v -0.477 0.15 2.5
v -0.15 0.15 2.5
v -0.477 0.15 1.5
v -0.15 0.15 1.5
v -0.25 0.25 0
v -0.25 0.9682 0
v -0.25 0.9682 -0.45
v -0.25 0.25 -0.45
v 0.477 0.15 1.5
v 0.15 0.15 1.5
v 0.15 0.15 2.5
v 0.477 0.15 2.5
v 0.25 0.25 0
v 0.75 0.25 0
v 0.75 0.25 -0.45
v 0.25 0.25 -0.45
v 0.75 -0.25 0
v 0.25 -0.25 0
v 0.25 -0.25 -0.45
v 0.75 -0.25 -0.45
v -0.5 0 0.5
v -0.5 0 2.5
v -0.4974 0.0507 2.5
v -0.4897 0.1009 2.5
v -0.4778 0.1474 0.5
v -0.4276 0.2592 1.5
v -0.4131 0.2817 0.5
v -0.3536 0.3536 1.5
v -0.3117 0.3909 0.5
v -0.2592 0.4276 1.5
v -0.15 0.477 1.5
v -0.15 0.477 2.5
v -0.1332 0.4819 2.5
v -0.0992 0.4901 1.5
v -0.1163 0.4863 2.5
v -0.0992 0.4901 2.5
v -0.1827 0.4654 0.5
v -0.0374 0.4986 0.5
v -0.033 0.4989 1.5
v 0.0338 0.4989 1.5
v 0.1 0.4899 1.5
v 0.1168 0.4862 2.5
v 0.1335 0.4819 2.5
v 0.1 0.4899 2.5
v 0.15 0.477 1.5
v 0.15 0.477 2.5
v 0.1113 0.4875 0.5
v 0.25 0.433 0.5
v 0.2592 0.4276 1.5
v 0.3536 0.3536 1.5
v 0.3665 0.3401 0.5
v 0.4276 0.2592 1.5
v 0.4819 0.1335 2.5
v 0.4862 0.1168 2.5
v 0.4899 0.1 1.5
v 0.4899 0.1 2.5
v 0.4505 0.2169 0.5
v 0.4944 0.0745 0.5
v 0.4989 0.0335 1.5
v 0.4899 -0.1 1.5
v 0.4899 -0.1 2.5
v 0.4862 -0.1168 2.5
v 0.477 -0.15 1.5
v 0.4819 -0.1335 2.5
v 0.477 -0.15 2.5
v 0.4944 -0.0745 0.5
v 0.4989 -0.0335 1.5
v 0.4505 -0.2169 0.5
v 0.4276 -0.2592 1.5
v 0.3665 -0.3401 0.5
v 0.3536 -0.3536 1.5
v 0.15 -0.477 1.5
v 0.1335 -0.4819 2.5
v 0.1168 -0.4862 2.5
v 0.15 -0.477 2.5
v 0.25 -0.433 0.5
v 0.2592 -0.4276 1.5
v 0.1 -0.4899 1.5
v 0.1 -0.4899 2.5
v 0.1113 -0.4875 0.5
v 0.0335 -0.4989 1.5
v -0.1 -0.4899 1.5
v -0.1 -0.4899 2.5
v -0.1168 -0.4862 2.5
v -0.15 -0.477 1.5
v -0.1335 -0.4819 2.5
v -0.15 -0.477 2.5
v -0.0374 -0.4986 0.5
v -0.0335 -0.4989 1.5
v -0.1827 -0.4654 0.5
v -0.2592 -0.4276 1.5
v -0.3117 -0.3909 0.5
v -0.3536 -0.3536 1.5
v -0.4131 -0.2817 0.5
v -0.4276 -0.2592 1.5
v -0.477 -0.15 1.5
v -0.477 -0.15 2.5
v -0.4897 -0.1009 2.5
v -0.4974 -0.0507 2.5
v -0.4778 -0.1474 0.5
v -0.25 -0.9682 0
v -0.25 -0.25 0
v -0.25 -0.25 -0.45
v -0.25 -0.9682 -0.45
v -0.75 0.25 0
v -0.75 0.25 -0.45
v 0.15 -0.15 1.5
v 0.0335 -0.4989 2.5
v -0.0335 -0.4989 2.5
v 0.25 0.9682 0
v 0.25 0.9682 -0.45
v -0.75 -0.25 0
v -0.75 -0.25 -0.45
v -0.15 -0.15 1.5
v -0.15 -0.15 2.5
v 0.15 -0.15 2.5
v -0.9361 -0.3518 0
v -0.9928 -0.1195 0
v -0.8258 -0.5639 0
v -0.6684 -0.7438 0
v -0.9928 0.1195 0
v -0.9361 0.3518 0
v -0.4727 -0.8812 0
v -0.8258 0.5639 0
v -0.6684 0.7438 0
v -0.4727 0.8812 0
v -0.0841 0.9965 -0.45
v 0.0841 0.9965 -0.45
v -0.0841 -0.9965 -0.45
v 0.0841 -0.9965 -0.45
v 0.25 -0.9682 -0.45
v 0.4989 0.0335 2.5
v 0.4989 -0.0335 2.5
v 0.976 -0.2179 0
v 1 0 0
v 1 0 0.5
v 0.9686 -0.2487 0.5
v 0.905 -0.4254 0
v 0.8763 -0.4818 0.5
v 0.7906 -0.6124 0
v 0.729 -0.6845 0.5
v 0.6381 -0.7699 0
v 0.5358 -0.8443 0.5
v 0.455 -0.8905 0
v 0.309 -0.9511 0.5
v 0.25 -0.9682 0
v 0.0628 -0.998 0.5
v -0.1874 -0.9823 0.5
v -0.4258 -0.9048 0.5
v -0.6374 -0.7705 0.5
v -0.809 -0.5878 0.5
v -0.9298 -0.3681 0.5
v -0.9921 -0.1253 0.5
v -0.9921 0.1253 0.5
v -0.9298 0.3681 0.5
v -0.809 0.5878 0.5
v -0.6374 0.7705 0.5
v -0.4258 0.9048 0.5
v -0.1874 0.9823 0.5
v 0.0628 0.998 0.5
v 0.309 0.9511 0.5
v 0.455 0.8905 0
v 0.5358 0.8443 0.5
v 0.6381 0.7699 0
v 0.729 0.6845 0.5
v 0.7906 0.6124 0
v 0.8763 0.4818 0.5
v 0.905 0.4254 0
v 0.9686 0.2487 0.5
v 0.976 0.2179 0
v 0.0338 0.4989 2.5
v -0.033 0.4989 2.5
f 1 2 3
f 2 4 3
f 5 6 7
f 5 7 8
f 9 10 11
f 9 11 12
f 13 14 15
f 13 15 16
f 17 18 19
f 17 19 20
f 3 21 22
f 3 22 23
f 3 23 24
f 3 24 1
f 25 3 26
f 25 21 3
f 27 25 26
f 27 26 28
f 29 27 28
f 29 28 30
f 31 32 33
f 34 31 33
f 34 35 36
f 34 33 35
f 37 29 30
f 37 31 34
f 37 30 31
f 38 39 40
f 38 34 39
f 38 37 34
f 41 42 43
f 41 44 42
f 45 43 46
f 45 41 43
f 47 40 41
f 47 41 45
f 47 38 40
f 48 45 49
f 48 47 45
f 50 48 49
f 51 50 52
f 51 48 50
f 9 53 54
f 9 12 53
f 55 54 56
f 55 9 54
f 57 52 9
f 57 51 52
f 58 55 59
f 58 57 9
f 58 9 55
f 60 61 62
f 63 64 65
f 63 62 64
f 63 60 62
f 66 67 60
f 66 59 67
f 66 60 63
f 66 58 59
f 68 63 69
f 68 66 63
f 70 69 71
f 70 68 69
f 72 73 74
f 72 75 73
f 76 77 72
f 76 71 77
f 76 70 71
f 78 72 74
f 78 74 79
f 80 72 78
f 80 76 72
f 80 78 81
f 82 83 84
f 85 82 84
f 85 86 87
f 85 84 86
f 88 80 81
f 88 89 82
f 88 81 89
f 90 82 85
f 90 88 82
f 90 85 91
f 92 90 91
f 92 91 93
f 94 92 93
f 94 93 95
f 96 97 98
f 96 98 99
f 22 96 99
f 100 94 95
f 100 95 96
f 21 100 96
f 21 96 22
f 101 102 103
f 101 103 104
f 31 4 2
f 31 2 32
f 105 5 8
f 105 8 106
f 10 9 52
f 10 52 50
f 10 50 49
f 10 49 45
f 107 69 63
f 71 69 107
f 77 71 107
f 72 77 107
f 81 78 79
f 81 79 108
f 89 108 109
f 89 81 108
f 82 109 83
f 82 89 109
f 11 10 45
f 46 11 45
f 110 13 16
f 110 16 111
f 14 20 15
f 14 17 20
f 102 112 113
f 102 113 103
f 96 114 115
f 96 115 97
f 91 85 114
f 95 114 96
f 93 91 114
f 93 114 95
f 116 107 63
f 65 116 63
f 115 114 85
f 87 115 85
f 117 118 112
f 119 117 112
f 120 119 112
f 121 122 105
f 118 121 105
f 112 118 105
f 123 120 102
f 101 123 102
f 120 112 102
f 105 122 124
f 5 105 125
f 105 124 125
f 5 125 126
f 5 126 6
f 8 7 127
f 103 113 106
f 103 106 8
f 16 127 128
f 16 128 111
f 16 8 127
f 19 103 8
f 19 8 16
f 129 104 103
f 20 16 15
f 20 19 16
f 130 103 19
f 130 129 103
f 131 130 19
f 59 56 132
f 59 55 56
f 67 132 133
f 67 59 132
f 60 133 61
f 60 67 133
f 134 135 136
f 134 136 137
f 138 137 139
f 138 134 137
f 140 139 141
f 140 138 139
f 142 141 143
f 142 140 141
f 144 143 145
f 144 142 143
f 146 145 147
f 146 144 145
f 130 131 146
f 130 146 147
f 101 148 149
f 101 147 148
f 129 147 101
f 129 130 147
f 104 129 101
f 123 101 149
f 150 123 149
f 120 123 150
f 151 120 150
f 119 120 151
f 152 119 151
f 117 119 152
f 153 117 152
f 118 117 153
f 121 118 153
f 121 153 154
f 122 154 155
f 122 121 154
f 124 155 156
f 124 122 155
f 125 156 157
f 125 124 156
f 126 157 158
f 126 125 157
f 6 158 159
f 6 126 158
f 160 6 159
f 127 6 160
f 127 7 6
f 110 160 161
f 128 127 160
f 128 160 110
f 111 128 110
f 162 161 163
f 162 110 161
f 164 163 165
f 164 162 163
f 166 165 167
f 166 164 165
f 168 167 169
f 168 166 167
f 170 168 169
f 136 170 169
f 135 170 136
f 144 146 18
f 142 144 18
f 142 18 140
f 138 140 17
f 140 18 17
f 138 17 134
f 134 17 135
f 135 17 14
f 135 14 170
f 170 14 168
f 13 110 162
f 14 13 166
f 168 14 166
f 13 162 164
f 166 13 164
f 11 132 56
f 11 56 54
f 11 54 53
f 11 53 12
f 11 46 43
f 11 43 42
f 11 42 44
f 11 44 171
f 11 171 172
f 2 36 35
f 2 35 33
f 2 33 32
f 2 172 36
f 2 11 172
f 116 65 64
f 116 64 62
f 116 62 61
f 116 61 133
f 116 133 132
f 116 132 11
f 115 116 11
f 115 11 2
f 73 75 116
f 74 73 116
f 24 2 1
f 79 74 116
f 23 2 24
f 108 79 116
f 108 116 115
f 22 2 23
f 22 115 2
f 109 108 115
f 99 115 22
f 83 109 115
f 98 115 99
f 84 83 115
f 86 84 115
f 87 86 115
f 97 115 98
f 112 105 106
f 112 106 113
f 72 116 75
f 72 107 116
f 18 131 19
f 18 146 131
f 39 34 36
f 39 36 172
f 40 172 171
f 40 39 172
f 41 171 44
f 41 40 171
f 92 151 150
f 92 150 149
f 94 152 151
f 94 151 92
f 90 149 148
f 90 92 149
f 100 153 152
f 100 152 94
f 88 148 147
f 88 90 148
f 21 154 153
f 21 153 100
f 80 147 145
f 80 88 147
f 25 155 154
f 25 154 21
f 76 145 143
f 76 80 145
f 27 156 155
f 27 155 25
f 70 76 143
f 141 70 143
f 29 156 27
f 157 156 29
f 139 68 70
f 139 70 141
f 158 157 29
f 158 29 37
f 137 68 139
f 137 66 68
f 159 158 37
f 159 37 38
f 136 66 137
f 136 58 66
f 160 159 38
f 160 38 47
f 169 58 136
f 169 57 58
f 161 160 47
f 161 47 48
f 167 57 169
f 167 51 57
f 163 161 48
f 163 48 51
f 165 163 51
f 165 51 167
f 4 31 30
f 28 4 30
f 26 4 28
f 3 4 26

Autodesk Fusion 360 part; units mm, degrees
sketch "Sketch1" plane through (0, 0, 0) normal (0, 0, 1) x (1, 0, 0)
  circle A0 centre (0, 0) radius 1
extrude "Extrude1" add sketch "Sketch1" along normal blind 0.5
sketch "Sketch2" plane through (0, 0, 0.5) normal (0, 0, 1) x (-1, 0, 0)
  circle A0 centre (0, 0) radius 1
  circle A1 centre (0, 0) radius 0.5
extrude "Extrude2" add sketch "Sketch2" along normal blind 1 contours A1
sketch "Sketch3" plane through (0, 0, 1.5) normal (0, 0, 1) x (-1, 0, 0)
  circle A0 centre (0, 0) radius 0.5
  arc A1 (-0.1, -0.4899) -> (0.0992, -0.4901) centre (0, 0) ccw
  arc A2 (0.4899, -0.1) -> (0.4901, 0.0992) centre (0, 0) ccw
  arc A3 (0.1, 0.4899) -> (-0.1, 0.4899) centre (0, 0) ccw
  arc A4 (-0.4899, 0.1) -> (-0.4899, -0.1) centre (0, 0) ccw
  arc A5 (-0.15, -0.477) -> (0.15, -0.477) centre (0, 0) ccw
  arc A6 (-0.477, 0.15) -> (-0.477, -0.15) centre (0, 0) ccw
  arc A7 (0.477, -0.15) -> (0.477, 0.15) centre (0, 0) ccw
  arc A8 (0.15, 0.477) -> (-0.15, 0.477) centre (0, 0) ccw
  line L0 (-0.15, -0.15) -> (-0.15, -0.45)
  line L1 (-0.15, -0.45) -> (-0.15, -0.477)
  line L2 (-0.15, -0.15) -> (-0.477, -0.15)
  line L3 (0.15, -0.15) -> (0.15, -0.477)
  line L4 (0.15, -0.15) -> (0.477, -0.15)
  line L5 (-0.15, 0.15) -> (-0.477, 0.15)
  line L6 (-0.15, 0.15) -> (-0.15, 0.477)
  line L7 (0.15, 0.15) -> (0.15, 0.477)
  line L8 (0.15, 0.15) -> (0.477, 0.15)
extrude "Extrude4" add sketch "Sketch3" along normal blind 1 contours A0 A1 A2 A3 A4 A5 A6 A7 A8 L0 L1 L2 L3 L4 L5 L6 L7 L8
sketch "Sketch4" plane through (0, 0, 0) normal (0, 0, -1) x (1, 0, 0)
  circle A0 centre (0, 0) radius 1
  line L0 (0.25, -0.25) -> (0.25, -0.9682)
  line L1 (0.25, 0.9682) -> (0.25, 0.25)
  line L2 (0.25, 0.25) -> (0.75, 0.25)
  line L3 (0.75, 0.25) -> (0.75, -0.25)
  line L4 (-0.75, -0.25) -> (-0.75, 0.25)
  line L5 (-0.75, 0.25) -> (-0.25, 0.25)
  line L6 (-0.25, -0.9682) -> (-0.25, -0.25)
  line L7 (-0.25, 0.25) -> (-0.25, 0.9682)
  arc A1 (0.25, 0.9682) -> (-0.25, 0.9682) centre (0, 0) ccw
  arc A2 (-0.25, -0.9682) -> (0.25, -0.9682) centre (0, 0) ccw
  line L8 (0.75, -0.25) -> (0.25, -0.25)
  line L9 (-0.25, -0.25) -> (-0.75, -0.25)
extrude "Extrude5" add sketch "Sketch4" along normal blind 0.45 contours A0 L0 L1 L2 L3 L4 L5 L6 L7 A1 A2 L8 L9
